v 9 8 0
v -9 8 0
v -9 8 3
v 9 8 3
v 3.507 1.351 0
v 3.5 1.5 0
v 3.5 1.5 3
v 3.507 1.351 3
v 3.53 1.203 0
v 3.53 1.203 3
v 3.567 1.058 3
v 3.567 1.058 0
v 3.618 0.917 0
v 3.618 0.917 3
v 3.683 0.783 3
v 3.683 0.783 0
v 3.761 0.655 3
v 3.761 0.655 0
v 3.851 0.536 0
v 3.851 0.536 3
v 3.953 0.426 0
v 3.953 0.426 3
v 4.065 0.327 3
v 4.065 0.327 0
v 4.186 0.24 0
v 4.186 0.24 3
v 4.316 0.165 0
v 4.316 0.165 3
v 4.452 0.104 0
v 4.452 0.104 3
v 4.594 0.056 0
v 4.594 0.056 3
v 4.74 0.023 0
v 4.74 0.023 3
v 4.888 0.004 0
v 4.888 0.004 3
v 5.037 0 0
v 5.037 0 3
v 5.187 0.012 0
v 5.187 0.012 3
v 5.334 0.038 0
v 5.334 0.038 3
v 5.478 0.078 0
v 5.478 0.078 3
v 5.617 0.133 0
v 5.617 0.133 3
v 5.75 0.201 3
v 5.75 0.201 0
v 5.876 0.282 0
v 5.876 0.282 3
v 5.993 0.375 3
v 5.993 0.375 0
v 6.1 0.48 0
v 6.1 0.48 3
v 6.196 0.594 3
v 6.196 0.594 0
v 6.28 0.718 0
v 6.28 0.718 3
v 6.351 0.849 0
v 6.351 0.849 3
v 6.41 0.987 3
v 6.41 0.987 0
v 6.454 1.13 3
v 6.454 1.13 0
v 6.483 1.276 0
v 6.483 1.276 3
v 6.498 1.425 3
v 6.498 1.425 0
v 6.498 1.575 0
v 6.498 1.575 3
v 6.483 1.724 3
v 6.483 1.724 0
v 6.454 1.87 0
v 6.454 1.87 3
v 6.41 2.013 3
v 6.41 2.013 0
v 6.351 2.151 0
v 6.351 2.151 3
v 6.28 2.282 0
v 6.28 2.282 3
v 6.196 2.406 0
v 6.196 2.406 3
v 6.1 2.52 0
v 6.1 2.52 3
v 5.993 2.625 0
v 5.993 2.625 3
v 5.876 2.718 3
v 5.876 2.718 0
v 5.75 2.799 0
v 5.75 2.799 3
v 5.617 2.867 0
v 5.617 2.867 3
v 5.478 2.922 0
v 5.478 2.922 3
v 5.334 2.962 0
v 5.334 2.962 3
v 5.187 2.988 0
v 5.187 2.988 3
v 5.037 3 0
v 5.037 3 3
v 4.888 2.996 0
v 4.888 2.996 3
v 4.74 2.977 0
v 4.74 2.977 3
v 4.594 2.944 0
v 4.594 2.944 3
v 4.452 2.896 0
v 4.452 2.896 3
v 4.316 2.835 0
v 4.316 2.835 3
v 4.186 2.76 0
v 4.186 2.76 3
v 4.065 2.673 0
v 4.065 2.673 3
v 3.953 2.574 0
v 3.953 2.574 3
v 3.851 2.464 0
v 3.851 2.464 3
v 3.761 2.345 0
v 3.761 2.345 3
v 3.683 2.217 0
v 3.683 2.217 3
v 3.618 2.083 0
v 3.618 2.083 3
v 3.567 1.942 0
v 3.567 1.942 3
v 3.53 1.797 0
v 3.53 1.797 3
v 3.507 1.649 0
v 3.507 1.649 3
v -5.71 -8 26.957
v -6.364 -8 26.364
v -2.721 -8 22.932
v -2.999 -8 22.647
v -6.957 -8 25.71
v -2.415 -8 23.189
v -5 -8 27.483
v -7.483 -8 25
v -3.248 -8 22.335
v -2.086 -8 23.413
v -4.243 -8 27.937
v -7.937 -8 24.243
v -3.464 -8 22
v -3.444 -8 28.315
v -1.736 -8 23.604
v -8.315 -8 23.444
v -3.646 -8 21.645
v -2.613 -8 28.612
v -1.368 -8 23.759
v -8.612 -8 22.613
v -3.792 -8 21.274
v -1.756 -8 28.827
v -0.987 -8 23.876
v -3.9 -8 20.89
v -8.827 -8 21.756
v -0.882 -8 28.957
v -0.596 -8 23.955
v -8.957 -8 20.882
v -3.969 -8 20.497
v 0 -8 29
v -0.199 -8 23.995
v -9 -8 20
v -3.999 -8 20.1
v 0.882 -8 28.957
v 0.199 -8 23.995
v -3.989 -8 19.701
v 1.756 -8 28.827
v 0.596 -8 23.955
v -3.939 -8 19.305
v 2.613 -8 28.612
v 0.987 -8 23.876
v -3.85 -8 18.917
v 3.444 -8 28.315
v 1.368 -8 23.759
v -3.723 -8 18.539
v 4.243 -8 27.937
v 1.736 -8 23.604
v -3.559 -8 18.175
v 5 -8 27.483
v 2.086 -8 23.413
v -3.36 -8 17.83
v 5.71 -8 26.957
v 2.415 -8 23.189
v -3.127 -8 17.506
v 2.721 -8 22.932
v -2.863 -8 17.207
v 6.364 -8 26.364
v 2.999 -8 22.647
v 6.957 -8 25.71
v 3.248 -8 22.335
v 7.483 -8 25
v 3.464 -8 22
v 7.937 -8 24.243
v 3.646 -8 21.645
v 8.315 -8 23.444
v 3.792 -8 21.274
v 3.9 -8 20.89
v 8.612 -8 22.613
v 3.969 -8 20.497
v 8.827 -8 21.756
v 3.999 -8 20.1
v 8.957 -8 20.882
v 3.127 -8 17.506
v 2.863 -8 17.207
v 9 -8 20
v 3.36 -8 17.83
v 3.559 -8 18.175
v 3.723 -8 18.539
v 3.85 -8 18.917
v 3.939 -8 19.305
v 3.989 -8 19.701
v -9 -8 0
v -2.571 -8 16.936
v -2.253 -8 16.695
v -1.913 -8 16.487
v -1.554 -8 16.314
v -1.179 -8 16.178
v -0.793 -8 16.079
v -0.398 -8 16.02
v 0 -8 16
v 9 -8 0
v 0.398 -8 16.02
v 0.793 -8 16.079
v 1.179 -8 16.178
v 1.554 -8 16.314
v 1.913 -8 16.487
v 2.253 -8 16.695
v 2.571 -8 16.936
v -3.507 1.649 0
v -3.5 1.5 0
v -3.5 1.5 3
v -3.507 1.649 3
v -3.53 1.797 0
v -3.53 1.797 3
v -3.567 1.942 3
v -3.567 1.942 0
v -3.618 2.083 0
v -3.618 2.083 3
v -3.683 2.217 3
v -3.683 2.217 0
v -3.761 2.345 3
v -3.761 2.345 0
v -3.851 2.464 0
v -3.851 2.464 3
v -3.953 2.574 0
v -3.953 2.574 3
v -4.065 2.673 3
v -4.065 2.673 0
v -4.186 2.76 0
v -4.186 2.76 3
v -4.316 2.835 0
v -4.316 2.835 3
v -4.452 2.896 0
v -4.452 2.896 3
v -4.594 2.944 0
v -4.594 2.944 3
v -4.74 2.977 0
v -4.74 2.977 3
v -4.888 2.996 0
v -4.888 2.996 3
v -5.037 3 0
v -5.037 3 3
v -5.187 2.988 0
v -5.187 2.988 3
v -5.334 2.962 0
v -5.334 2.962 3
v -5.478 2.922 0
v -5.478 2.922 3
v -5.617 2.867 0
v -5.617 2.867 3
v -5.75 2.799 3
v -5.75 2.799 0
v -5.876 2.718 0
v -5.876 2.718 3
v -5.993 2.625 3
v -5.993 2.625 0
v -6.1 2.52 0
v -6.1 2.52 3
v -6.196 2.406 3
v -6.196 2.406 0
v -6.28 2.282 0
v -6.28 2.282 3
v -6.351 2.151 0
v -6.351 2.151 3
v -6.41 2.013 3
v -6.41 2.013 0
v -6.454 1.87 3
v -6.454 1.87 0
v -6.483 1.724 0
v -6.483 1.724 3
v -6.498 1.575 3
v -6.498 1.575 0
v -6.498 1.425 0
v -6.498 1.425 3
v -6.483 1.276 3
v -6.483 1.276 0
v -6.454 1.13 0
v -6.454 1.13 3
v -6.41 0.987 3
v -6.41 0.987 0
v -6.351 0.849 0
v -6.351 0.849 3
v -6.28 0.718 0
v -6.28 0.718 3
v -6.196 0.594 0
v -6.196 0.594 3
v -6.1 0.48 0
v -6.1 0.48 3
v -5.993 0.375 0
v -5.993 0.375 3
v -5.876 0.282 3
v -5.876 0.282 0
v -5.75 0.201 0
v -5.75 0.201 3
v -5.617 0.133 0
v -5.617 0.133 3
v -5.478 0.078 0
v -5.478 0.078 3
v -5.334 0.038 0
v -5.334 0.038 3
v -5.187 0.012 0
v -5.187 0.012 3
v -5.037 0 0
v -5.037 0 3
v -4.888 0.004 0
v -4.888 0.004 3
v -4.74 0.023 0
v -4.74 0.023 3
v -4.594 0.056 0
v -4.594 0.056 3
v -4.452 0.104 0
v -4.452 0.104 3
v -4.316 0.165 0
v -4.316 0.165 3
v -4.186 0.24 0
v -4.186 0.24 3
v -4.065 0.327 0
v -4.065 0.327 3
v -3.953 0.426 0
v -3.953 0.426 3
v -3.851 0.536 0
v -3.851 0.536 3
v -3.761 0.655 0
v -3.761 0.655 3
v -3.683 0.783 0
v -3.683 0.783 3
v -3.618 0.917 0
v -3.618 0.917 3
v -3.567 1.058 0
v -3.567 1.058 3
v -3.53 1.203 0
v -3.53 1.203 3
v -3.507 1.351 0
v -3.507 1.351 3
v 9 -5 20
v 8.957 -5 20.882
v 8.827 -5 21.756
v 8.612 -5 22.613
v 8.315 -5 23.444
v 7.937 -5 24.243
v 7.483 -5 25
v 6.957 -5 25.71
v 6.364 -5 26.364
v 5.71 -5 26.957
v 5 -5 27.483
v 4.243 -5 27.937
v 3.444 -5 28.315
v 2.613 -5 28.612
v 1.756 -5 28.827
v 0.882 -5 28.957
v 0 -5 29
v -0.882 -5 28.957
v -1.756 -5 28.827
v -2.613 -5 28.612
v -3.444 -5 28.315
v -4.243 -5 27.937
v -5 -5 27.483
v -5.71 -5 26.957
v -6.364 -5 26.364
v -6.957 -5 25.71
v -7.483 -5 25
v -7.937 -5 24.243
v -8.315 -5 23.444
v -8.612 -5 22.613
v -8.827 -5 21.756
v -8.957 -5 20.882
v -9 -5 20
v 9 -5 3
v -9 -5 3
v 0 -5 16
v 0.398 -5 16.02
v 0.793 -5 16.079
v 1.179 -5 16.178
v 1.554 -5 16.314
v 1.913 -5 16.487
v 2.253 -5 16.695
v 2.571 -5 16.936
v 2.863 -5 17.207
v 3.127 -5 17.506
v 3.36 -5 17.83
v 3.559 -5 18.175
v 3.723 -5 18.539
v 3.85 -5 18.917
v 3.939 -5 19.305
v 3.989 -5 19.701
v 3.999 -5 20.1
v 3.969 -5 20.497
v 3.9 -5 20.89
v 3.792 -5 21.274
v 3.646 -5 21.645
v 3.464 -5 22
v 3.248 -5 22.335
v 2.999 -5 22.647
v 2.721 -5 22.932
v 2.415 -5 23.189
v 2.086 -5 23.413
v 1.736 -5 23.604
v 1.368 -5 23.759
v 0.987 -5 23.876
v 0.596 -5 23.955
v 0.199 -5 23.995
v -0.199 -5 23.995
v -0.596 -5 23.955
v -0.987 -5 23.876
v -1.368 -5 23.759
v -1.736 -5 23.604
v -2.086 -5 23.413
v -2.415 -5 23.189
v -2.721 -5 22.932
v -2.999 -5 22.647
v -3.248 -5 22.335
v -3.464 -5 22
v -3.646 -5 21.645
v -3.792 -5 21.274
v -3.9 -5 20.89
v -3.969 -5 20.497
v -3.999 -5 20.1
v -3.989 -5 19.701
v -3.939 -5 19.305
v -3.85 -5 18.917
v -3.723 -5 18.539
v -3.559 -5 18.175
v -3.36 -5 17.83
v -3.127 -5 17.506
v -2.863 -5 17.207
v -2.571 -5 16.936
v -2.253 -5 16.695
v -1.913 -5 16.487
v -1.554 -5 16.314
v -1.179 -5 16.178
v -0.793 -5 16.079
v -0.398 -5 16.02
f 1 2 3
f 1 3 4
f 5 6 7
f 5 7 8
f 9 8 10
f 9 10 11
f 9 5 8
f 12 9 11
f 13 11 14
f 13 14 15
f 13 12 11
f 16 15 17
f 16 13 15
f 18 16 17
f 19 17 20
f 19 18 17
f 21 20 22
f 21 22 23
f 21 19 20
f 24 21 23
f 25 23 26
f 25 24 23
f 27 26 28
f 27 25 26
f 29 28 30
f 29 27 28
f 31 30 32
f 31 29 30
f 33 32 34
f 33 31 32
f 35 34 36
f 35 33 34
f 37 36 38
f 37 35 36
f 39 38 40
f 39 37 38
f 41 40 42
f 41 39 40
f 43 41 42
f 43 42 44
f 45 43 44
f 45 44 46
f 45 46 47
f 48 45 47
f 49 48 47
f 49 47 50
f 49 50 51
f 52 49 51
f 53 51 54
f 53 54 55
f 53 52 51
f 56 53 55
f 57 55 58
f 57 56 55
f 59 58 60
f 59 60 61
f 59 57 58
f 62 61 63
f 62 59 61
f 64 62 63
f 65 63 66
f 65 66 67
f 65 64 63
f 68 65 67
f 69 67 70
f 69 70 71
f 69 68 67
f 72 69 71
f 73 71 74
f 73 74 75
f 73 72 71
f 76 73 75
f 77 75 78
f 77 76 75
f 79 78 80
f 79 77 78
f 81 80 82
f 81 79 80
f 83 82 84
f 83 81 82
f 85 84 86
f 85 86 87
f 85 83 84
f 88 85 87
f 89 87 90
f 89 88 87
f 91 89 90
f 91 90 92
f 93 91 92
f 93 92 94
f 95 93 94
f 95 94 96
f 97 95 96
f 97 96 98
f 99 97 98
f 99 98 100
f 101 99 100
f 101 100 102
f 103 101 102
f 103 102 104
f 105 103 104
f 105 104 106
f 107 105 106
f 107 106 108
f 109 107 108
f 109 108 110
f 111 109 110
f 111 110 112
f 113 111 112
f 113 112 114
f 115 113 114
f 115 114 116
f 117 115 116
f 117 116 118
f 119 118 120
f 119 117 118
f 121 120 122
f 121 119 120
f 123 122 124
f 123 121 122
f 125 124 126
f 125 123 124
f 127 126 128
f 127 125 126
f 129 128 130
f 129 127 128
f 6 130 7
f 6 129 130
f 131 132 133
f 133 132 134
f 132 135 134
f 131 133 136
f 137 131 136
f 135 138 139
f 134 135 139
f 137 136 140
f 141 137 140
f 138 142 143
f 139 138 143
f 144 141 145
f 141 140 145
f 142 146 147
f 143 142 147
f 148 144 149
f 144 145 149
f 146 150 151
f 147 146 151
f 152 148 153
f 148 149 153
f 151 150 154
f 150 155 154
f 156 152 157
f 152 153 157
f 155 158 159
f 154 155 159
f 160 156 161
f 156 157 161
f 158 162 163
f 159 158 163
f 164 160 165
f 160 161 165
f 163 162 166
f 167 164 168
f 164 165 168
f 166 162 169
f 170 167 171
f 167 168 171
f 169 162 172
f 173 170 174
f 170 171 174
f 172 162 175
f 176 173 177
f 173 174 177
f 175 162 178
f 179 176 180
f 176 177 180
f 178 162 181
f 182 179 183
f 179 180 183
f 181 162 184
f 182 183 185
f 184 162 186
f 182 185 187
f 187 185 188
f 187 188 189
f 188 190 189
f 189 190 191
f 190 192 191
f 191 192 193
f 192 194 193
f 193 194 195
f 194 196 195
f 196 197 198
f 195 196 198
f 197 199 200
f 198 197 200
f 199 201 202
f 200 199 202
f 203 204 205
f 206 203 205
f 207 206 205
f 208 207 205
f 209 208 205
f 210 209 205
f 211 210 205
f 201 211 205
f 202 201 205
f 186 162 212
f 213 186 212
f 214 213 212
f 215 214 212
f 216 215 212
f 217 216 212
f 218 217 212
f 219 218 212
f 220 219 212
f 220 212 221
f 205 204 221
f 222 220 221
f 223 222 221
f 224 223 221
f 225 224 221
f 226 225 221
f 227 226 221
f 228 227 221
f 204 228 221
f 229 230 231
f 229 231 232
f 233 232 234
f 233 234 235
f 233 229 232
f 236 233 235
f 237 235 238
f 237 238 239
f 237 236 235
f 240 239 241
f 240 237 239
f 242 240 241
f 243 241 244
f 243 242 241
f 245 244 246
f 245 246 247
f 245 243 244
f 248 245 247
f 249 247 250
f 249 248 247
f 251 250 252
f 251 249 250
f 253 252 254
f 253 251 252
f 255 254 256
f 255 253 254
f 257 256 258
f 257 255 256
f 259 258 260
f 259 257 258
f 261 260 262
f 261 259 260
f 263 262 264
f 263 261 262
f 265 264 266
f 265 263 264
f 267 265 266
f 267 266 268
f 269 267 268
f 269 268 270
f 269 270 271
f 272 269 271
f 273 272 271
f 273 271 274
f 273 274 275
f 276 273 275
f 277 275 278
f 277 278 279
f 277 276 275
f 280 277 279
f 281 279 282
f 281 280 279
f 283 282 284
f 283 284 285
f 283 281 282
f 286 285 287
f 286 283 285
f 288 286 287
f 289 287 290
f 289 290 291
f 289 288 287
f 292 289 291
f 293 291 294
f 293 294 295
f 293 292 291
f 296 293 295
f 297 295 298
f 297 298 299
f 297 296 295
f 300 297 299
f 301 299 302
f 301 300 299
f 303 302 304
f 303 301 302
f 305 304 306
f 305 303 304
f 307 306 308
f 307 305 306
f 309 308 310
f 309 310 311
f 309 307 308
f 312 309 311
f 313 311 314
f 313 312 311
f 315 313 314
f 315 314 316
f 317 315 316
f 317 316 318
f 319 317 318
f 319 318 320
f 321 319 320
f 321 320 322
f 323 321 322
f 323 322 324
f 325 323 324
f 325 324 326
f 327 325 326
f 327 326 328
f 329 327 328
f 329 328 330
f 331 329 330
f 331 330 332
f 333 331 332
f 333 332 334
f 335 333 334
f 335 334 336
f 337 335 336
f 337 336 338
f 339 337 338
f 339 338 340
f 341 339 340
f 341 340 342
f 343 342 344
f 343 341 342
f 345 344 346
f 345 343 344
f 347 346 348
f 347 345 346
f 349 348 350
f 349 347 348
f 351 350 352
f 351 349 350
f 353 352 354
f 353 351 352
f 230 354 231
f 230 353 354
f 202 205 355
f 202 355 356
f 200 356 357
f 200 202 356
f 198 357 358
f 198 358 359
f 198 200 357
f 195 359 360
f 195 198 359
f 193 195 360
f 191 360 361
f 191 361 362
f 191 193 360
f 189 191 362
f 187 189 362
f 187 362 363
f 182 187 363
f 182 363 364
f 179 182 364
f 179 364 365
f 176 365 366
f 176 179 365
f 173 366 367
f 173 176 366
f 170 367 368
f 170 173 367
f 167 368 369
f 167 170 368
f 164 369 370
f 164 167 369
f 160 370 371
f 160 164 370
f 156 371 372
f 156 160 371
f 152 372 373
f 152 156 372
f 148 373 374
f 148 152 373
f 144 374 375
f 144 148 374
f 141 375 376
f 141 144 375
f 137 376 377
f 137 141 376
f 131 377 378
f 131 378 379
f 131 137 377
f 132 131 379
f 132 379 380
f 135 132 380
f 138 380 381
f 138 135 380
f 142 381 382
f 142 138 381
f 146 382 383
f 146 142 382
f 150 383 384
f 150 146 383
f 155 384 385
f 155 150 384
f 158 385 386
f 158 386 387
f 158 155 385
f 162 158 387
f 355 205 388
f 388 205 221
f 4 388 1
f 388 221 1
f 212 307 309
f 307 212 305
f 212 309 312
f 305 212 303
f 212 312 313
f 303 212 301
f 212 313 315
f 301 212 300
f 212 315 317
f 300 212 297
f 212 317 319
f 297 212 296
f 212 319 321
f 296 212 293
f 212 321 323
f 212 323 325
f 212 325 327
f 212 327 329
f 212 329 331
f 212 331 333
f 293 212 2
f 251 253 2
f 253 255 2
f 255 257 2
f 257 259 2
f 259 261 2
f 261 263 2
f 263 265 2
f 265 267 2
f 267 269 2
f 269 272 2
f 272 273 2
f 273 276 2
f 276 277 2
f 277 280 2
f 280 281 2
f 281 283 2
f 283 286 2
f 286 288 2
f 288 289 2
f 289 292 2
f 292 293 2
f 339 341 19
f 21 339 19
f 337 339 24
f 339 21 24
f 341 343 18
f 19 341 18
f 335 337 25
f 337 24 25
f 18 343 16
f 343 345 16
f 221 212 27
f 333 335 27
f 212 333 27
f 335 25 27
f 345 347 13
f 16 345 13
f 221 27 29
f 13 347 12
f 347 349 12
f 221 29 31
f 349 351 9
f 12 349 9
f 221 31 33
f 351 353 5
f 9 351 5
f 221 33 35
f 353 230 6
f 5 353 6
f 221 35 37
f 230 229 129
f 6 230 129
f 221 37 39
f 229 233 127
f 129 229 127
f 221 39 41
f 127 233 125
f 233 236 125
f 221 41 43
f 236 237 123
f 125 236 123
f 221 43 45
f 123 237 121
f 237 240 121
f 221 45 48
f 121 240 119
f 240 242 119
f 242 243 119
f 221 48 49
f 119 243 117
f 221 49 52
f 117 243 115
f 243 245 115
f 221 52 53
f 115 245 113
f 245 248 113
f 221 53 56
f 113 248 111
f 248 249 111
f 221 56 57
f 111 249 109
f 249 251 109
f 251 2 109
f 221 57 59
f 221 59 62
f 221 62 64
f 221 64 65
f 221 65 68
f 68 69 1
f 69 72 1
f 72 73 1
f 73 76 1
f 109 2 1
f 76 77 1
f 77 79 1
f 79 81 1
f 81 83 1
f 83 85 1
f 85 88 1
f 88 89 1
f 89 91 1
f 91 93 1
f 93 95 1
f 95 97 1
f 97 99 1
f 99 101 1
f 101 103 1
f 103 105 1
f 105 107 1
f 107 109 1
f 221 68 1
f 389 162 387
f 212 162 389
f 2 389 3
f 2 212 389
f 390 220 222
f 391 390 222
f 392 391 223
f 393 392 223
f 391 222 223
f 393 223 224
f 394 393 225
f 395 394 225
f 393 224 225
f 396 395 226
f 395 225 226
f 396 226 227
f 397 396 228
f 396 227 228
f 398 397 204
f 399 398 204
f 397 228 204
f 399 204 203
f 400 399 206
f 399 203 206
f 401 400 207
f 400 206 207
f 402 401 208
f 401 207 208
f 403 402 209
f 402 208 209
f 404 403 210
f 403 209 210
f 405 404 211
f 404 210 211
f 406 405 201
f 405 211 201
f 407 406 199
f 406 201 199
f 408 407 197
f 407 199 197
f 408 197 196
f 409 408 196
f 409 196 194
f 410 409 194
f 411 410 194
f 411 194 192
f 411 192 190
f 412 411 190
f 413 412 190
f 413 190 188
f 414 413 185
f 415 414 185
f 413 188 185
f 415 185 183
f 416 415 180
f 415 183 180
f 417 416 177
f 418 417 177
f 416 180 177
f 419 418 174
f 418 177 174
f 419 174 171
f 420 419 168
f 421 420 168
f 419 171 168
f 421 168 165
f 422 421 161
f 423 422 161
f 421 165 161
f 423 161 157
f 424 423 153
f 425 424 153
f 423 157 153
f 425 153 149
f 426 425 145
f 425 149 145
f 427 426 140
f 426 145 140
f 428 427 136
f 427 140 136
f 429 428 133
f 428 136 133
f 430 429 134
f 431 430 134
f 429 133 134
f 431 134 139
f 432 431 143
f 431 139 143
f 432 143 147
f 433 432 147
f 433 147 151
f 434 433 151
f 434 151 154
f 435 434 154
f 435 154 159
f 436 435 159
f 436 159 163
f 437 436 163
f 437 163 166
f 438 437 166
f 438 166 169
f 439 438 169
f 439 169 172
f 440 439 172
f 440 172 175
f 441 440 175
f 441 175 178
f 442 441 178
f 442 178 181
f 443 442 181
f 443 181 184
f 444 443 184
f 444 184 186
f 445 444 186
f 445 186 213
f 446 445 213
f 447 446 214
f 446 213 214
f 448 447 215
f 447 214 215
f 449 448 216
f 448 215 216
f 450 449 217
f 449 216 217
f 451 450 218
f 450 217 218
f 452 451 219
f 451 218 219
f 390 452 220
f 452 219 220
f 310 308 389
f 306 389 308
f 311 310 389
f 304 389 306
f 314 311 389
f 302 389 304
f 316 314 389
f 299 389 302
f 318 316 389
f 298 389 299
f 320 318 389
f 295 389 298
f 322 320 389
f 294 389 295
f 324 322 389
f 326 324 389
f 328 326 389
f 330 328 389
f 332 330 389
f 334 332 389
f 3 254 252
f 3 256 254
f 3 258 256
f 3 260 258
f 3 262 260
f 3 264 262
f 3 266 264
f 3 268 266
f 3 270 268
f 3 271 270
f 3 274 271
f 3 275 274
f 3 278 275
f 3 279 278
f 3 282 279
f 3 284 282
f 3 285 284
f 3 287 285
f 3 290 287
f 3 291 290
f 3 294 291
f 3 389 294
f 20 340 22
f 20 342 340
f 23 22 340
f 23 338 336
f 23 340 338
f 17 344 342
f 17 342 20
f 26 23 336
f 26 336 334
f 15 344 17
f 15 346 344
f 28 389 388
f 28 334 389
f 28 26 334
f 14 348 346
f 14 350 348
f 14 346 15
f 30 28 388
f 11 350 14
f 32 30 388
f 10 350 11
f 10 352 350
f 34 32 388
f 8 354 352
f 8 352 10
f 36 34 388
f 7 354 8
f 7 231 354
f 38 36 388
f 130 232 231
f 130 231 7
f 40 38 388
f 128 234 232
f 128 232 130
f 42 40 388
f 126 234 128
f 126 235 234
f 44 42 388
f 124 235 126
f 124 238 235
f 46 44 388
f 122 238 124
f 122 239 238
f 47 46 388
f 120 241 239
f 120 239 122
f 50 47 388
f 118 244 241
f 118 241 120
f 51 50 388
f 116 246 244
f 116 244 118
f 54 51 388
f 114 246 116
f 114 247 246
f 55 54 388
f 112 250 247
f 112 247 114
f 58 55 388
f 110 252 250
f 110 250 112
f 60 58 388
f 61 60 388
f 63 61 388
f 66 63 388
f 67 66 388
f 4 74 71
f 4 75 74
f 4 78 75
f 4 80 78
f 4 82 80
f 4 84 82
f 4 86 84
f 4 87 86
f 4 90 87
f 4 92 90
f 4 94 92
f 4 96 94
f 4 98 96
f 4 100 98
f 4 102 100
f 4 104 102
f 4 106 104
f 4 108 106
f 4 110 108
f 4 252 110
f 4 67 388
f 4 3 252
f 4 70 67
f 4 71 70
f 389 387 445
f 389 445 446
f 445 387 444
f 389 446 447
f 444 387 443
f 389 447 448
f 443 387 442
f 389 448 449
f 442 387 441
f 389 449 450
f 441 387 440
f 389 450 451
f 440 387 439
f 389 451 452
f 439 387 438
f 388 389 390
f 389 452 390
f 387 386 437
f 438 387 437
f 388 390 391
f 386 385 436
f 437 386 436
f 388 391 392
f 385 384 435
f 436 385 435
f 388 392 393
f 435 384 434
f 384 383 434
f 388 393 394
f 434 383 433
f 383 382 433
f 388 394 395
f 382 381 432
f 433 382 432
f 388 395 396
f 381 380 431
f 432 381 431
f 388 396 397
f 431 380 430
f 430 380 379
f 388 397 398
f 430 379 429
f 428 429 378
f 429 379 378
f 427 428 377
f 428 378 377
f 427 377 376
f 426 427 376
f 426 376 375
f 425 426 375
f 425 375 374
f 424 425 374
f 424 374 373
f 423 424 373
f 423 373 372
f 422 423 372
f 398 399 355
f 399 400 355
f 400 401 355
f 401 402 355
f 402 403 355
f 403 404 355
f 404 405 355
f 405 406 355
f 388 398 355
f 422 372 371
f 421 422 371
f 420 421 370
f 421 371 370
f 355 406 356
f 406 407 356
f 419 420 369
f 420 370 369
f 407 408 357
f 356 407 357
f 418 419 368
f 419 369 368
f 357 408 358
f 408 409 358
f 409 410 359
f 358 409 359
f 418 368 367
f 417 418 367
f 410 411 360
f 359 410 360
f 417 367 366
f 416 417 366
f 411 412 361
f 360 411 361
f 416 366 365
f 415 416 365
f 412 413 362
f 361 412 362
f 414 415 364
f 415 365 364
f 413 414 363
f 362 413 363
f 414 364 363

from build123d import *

# Parameters (mm, degrees)
SKETCH_1_W      = 18
SKETCH_1_H      = 16
SKETCH_1_R      = 1.5
EXTRUDE_1_DEPTH = 3
SKETCH_3_R      = 4
EXTRUDE_2_DEPTH = 3


with BuildPart() as part:
    # 草图1 → 凸台-拉伸1 (new body)
    with BuildSketch(Plane.XY):
        Rectangle(SKETCH_1_W, SKETCH_1_H)
        with Locations((-5, 1.5)):
            Circle(SKETCH_1_R, mode=Mode.SUBTRACT)
        with Locations(Location((5, 1.5, 0), (0, 0, 180))):
            Circle(SKETCH_1_R, mode=Mode.SUBTRACT)
    extrude(amount=EXTRUDE_1_DEPTH)

    # 草图3 → 凸台-拉伸2 (add)
    with BuildSketch(Plane.XZ.offset(8)):
        with BuildLine():
            Line((-9, 0), (9, 0))
            Line((9, 0), (9, 20))
            ThreePointArc((9, 20), (0, 29), (-9, 20))
            Line((-9, 20), (-9, 0))
        make_face()
        with Locations(Location((0, 20, 0), (0, 0, 270))):
            Circle(SKETCH_3_R, mode=Mode.SUBTRACT)
    extrude(amount=-EXTRUDE_2_DEPTH)


solid = part.part
